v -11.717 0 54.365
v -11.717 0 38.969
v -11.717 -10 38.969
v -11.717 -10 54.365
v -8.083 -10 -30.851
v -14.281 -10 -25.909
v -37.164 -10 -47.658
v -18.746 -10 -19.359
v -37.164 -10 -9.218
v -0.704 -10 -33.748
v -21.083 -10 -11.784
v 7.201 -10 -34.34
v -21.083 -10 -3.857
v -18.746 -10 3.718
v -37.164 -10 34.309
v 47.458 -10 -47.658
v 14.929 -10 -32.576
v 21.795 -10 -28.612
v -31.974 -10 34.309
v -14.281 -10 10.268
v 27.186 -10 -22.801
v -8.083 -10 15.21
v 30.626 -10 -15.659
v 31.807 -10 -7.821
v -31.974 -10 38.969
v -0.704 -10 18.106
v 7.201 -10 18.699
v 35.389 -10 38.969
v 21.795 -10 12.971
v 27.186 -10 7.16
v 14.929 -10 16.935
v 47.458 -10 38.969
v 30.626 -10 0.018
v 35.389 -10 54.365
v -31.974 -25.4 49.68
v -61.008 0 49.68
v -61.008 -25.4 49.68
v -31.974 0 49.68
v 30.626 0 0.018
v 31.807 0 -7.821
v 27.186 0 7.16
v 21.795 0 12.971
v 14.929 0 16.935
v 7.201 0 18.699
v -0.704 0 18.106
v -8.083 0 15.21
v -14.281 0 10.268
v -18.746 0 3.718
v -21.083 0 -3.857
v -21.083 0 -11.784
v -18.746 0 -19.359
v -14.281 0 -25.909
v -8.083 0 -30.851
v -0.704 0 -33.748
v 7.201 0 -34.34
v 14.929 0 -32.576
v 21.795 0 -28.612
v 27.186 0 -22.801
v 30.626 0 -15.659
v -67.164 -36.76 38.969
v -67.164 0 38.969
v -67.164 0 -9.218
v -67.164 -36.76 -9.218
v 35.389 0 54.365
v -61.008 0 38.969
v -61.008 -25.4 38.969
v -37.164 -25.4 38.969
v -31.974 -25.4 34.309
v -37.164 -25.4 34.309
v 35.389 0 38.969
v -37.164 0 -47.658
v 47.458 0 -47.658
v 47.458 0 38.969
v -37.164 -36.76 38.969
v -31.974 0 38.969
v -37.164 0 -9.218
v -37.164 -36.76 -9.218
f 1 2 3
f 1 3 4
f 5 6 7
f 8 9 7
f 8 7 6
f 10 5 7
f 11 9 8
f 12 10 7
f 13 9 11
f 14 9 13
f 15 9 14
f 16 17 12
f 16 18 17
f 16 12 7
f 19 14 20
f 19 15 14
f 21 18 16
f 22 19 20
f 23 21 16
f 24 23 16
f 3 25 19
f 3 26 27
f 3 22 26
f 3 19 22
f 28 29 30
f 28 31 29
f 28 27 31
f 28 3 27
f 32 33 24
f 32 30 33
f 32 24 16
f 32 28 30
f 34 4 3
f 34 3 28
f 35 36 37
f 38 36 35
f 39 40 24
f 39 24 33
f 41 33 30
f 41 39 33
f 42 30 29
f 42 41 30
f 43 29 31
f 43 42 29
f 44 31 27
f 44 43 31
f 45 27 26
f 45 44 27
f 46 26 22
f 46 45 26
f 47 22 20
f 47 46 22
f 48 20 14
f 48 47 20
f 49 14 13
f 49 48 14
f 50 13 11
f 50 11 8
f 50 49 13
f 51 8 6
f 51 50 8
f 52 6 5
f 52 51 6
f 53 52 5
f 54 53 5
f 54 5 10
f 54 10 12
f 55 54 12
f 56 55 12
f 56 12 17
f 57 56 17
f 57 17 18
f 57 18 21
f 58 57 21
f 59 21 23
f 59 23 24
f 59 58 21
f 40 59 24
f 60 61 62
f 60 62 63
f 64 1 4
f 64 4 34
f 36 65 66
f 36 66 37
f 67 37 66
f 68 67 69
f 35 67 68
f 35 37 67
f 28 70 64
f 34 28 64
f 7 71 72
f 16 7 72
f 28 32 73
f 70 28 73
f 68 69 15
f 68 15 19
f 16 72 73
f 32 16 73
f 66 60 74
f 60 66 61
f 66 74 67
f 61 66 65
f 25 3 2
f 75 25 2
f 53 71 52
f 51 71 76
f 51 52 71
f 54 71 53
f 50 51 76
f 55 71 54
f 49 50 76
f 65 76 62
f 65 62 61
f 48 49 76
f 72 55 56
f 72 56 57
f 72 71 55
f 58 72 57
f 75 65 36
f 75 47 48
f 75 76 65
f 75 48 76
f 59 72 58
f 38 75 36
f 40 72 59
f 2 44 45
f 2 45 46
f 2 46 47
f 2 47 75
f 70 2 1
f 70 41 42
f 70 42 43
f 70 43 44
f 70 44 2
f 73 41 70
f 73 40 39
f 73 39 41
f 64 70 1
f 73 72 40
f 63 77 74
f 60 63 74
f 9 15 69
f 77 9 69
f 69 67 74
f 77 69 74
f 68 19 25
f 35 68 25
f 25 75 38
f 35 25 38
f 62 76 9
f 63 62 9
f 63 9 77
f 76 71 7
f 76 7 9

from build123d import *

# Parameters (mm, degrees)
F0_W     = 84.6221074462
F0_H     = 86.6273678839
F0_R     = 26.5937510692
F1_DEPTH = 10
F2_W     = 26.760289222
F2_H     = 48.1868900824
F2_W_2   = 10
F3_DEPTH = 30
F4_W     = 29.033318162
F4_H     = 15.370901674
F5_DEPTH = 25.4
F6_W     = 47.1061710268
F6_H     = 18.6824947596
F7_DEPTH = 10


with BuildPart() as f1:
    # F0 (on Front) → F1 (new body)
    with BuildSketch(Plane.XZ):
        with Locations((5.1468424499, -4.3447371572)):
            Rectangle(F0_W, F0_H)
        with Locations((5.2136839367, -7.8205261379)):
            Circle(F0_R, mode=Mode.SUBTRACT)
    extrude(amount=F1_DEPTH)

    # F2 (on face) → F3 (join)
    with BuildSketch(Plane(origin=(-37.1642112732, 0, 0), x_dir=(0, -1, 0), z_dir=(-1, 0, 0))):
        with Locations((23.380144611, 14.8755017435)):
            Rectangle(F2_W, F2_H)
        with Locations((5, 14.8755017435)):
            Rectangle(F2_W_2, F2_H)
    extrude(amount=F3_DEPTH)

    # F4 (on Front) → F5 (join)
    with BuildSketch(Plane.XZ):
        with Locations((-46.4909225702, 41.9942829758)):
            Rectangle(F4_W, F4_H)
    extrude(amount=F5_DEPTH)

    # F6 (on Front) → F7 (join)
    with BuildSketch(Plane.XZ):
        with Locations((11.8363192305, 45.0233183801)):
            Rectangle(F6_W, F6_H)
    extrude(amount=F7_DEPTH)


solid = f1.part
